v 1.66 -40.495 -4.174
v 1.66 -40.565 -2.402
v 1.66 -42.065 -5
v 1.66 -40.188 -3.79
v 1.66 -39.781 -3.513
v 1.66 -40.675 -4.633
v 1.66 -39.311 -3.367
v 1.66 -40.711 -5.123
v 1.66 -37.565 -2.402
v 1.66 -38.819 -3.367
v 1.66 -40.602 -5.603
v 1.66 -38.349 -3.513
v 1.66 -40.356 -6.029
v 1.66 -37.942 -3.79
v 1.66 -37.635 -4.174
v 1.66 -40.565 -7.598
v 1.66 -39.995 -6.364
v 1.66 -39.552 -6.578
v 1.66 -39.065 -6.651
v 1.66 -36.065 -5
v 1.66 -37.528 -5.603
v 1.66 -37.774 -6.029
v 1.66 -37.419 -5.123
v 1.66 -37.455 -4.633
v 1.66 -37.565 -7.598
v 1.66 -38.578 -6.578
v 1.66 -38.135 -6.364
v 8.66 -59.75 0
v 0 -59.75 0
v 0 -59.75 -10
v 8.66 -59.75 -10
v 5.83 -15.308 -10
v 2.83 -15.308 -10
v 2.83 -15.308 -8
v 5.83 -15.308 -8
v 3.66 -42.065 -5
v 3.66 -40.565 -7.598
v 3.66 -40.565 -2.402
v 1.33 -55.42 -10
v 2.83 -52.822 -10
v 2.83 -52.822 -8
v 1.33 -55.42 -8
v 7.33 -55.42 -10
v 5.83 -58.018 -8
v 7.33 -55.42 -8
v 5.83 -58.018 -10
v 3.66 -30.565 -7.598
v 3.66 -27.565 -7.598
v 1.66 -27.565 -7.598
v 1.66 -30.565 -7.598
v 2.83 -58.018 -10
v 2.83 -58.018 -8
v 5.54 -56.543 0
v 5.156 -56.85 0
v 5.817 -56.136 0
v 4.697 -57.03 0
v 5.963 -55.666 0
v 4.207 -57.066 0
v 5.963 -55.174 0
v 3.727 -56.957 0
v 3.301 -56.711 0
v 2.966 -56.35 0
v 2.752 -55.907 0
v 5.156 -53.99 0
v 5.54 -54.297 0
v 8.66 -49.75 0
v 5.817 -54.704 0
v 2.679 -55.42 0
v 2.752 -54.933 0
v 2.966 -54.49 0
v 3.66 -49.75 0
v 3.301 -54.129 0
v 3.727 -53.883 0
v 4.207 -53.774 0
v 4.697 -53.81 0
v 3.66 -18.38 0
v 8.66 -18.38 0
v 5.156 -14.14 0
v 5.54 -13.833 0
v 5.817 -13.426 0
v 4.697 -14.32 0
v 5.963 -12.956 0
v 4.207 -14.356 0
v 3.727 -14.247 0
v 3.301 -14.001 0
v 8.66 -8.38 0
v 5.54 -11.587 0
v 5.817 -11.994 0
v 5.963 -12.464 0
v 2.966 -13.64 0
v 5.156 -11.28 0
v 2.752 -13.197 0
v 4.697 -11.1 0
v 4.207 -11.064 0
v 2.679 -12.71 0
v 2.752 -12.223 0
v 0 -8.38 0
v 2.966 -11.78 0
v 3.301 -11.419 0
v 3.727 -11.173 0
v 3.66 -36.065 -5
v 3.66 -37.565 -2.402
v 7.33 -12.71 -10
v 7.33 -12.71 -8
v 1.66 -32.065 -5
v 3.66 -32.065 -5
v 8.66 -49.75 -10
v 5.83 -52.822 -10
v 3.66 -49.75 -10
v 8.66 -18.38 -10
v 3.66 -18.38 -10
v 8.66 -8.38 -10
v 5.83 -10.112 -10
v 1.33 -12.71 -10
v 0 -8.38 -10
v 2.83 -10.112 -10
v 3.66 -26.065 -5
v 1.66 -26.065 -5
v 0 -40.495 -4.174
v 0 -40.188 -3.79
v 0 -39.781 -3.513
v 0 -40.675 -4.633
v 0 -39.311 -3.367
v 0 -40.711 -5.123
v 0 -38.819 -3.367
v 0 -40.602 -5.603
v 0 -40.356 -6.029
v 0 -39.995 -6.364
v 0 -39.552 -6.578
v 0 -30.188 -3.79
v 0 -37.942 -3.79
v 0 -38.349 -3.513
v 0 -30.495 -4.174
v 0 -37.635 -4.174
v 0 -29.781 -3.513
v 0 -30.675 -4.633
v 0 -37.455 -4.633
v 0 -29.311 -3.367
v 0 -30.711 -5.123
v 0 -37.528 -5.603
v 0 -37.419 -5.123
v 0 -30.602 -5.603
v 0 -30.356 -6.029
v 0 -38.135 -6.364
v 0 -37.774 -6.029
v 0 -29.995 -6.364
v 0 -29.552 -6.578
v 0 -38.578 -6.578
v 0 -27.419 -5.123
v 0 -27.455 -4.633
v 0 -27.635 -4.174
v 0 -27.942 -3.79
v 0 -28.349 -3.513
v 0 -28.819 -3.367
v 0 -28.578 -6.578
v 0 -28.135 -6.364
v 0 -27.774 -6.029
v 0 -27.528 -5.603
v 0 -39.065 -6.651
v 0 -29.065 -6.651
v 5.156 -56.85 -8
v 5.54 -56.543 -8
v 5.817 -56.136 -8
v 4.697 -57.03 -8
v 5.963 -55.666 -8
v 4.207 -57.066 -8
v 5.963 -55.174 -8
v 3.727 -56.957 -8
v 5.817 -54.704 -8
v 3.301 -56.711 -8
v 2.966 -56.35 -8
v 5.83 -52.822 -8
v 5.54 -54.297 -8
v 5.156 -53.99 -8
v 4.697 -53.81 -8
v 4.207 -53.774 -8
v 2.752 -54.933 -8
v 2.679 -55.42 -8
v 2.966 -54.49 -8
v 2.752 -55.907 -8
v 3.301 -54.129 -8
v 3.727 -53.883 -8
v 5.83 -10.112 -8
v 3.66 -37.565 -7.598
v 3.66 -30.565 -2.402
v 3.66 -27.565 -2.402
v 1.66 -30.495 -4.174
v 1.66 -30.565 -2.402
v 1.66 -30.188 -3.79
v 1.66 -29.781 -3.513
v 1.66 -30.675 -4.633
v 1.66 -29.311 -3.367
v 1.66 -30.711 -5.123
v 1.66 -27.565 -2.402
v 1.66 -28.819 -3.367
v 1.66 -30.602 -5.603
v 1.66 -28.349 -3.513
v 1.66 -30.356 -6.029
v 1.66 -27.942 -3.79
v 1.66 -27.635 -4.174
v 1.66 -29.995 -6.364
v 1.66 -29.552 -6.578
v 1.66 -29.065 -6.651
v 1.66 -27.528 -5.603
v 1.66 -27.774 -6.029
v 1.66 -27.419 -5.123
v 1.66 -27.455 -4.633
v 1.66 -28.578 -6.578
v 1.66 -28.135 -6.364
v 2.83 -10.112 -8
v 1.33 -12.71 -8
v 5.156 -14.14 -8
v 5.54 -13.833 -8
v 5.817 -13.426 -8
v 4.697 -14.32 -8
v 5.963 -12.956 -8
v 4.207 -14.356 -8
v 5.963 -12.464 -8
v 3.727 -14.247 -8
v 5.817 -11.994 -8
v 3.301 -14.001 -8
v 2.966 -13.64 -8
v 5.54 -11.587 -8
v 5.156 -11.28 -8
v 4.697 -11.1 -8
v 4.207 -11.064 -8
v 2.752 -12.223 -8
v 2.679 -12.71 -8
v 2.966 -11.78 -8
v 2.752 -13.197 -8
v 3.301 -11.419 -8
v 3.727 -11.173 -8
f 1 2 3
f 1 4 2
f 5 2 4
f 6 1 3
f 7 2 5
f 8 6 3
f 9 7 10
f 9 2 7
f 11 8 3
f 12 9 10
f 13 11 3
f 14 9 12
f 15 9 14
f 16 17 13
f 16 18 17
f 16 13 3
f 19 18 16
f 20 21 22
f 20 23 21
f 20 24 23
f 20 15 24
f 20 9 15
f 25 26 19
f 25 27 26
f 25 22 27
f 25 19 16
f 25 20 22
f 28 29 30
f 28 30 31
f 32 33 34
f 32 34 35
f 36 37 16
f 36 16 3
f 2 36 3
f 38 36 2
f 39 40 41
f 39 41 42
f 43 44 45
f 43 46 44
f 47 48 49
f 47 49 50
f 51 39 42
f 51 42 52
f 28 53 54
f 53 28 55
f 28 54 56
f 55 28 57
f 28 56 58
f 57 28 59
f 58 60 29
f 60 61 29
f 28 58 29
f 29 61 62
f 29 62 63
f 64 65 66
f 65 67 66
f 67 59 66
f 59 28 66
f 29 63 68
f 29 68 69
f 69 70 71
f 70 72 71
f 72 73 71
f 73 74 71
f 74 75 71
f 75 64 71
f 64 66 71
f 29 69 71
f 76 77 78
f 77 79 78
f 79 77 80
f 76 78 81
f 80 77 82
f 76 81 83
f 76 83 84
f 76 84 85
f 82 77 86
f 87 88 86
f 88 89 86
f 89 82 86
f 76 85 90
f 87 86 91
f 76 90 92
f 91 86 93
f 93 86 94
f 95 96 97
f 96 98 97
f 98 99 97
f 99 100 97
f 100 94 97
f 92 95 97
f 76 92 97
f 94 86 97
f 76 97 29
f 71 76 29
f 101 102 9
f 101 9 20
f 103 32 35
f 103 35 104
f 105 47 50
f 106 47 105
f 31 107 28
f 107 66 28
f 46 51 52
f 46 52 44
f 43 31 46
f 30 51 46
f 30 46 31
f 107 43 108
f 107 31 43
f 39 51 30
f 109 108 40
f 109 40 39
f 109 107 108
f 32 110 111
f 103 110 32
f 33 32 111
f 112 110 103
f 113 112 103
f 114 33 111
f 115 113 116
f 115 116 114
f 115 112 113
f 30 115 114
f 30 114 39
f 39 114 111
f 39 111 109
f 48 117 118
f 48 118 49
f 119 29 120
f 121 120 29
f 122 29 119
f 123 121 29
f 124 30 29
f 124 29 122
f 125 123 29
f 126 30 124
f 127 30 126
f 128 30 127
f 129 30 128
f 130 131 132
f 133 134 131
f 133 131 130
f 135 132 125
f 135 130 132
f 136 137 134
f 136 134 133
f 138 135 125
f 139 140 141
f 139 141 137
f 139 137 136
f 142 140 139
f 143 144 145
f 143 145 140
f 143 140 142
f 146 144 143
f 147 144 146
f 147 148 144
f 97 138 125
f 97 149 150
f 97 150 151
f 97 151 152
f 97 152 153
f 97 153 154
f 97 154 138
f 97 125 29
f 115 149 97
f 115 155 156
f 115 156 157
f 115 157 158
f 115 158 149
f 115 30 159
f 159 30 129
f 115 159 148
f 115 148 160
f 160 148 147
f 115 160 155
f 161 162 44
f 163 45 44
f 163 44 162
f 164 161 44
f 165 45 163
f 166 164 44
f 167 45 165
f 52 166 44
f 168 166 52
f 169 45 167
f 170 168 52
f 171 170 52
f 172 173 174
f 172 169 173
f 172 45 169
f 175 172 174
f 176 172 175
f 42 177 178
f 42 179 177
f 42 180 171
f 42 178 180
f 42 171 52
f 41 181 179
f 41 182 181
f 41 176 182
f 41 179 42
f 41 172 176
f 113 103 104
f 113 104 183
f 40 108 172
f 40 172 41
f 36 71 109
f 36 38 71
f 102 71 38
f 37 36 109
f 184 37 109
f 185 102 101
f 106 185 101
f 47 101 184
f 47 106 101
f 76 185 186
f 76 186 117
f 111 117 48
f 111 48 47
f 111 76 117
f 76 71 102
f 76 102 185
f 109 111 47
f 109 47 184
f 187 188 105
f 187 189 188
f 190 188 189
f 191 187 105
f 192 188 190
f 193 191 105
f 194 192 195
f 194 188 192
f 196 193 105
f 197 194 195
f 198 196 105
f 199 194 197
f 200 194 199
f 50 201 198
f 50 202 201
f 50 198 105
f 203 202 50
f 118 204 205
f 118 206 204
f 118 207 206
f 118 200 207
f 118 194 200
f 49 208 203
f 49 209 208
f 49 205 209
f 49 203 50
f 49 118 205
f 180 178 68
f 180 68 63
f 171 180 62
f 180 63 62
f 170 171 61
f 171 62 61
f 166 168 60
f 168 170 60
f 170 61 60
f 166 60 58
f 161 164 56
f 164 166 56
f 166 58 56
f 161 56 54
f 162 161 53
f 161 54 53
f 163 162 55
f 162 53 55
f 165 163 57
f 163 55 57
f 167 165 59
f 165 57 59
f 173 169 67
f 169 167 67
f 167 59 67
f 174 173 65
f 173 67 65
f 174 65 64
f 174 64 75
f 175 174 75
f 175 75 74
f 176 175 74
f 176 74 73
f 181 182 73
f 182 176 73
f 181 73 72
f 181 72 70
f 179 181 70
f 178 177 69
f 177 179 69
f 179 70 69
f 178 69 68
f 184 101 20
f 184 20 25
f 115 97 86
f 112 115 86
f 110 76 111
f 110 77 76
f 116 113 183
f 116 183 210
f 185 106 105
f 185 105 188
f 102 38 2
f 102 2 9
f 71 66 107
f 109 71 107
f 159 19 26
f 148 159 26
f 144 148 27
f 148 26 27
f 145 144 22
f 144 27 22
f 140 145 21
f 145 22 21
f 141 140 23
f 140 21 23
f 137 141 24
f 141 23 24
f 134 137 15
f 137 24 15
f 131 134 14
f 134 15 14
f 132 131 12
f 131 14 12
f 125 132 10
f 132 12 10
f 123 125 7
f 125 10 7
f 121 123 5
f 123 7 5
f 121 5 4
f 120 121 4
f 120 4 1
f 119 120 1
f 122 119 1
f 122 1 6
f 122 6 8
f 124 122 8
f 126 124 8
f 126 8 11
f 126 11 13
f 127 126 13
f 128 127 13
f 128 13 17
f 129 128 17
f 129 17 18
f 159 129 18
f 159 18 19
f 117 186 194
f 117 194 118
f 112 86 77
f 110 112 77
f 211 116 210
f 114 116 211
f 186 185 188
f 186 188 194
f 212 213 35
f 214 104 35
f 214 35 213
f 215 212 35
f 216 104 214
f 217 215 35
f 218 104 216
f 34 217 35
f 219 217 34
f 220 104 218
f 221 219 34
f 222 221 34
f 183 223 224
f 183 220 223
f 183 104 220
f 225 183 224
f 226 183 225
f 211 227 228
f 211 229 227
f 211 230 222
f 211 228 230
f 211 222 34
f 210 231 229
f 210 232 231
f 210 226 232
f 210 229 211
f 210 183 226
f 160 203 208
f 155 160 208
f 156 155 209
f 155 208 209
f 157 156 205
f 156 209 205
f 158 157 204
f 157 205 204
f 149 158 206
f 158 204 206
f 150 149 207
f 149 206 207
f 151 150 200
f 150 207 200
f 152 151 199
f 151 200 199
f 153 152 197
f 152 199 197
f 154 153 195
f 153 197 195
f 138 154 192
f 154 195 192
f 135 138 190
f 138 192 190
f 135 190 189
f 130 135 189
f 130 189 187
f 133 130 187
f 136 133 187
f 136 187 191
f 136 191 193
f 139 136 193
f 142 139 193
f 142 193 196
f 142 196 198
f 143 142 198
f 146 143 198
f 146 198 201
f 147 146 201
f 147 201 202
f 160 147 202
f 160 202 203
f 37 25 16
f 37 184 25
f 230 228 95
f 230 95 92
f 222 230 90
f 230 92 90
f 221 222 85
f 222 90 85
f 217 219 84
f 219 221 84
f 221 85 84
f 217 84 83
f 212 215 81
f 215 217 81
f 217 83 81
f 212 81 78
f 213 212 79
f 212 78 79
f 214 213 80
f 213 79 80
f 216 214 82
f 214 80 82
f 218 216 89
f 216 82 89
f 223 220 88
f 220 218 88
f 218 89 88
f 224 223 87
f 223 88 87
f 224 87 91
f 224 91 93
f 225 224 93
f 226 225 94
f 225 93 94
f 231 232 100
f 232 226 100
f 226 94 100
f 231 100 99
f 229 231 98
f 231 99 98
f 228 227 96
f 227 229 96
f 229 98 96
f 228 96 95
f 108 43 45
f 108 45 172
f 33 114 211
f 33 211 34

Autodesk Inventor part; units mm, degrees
ref_plane "YZ Plane" through (0, 0, 0) normal (1, 0, 0) x (0, 1, 0)
ref_plane "XZ Plane" through (0, 0, 0) normal (0, 1, 0) x (-1, 0, 0)
ref_plane "XY Plane" through (0, 0, 0) normal (0, 0, 1) x (1, 0, 0)
sketch "Sketch1" plane through (0, 0, 0) normal (0, 0, 1) x (1, 0, 0)
  line L0 (0, 0) -> (41.5, 0)
  line L1 (41.5, 0) -> (41.5, -73)
  line L2 (41.5, -73) -> (0, -73)
  line L3 (0, -73) -> (0, 0)
  line L4 (0, -73) -> (3.11, -73)
  line L5 (0, -73) -> (3.11, -73) construction
  line L6 (3.11, -73) -> (3.11, -69.85)
  line L7 (3.11, -73) -> (6.26, -73) construction
  line L8 (3.11, -69.85) -> (14.54, -69.85)
  line L9 (14.54, -69.85) -> (19.65, -69.85)
  line L10 (19.65, -69.85) -> (31.08, -69.85)
  circle A0 centre (3.11, -69.85) radius 1.6
  circle A1 centre (14.54, -69.85) radius 1.6
  circle A2 centre (19.65, -69.85) radius 1.6
  circle A3 centre (31.08, -69.85) radius 1.6
  line L11 (3.11, -69.85) -> (3.11, -55.42)
  line L12 (3.11, -69.85) -> (17.54, -69.85) construction
  line L13 (0, -73) -> (4.33, -73)
  line L14 (0, -73) -> (4.33, -73) construction
  line L15 (4.33, -73) -> (4.33, -53.49)
  line L16 (3.11, -55.42) -> (6.6479, -55.42)
  circle A4 centre (4.33, -55.42) radius 1.651
  line L17 (4.33, -55.42) -> (4.33, -37.69)
  line L18 (4.33, -55.42) -> (22.06, -55.42) construction
  line L19 (4.33, -55.42) -> (29.68, -55.42)
  line L20 (4.33, -55.42) -> (29.68, -55.42) construction
  circle A5 centre (4.33, -37.69) radius 1.651
  circle A6 centre (29.68, -55.42) radius 1.651
  line L21 (4.33, -37.69) -> (39.0376, -37.69)
  line L22 (29.68, -55.42) -> (29.68, -25.3245)
  circle A7 centre (29.68, -37.69) radius 1.651
  line L23 (4.33, -37.69) -> (4.33, -30.44)
  line L24 (4.33, -37.69) -> (11.58, -37.69) construction
  line L25 (4.33, -30.44) -> (4.33, -12.71)
  line L26 (4.33, -30.44) -> (29.68, -30.44)
  line L27 (4.33, -30.44) -> (29.68, -30.44) construction
  line L28 (4.33, -12.71) -> (29.68, -12.71)
  circle A8 centre (29.48, -12.71) radius 1.651
  circle A9 centre (4.33, -12.71) radius 1.651
  circle A10 centre (4.33, -30.44) radius 1.651
  circle A11 centre (29.68, -30.44) radius 1.651
  dimension "d0" = 41.5
  dimension "d1" = 73
  dimension "d2" = 3.11
  dimension "d3" = 0
  dimension "d4" = 3.15
  dimension "d5" = 90
  dimension "d6" = 11.43
  dimension "d7" = 90
  dimension "d9" = 5.11
  dimension "d10" = 11.43
  dimension "d11" = 180
  dimension "d12" = 3.2
  dimension "d13" = 3.2
  dimension "d14" = 3.2
  dimension "d15" = 3.2
  dimension "d18" = 14.43
  dimension "d19" = 90
  dimension "d20" = 4.33
  dimension "d21" = 0
  dimension "d22" = 3.302
  dimension "d23" = 17.73
  dimension "d24" = 90
  dimension "d25" = 25.35
  dimension "d26" = 0
  dimension "d27" = 3.302
  dimension "d28" = 3.302
  dimension "d29" = 3.302
  dimension "d30" = 7.25
  dimension "d31" = 90
  dimension "d32" = 17.73
  dimension "d33" = 180
  dimension "d34" = 25.35
  dimension "d35" = 0
  dimension "d36" = 25.35
  dimension "d37" = 3.302
  dimension "d38" = 3.302
  dimension "d39" = 3.302
  dimension "d40" = 3.302
extrude "Extrusion2" add sketch "Sketch1" along normal blind 2 contours L0 L1 L2 L15 A0 A4 L16 L19 A6 L22 A7 A11 L26 A10 L23 A5 L17 L11 L6 L3 | L6 A0 L15 L2 | L11 A4 L15 A0 | L15 L17 A5 L21 A7 L22 A6 L19 L16 A4 | L23 A10 L26 A11 L22 A7 L21 A5
sketch "Sketch3" plane through (0, 0, 2) normal (0, 0, 1) x (1, 0, 0)
  circle A0 centre (4.33, -55.42) radius 1.651 projected
  circle A1 centre (4.33, -55.42) radius 3.5
  circle A2 centre (29.68, -55.42) radius 1.651 projected
  circle A3 centre (29.68, -55.42) radius 3.5
  circle A4 centre (4.33, -12.71) radius 1.651 projected
  circle A5 centre (4.33, -12.71) radius 3.5
  circle A6 centre (29.48, -12.71) radius 1.651 projected
  circle A7 centre (29.48, -12.71) radius 3.5
  point P0 (0, 0)
  dimension "d46" = 7
  dimension "d47" = 7
  dimension "d48" = 7
  dimension "d49" = 7
extrude "Extrusion4" add sketch "Sketch3" along normal blind 10
sketch "Sketch8" plane through (0, 0, 0) normal (0, 0, -1) x (-1, 0, 0)
  circle A0 centre (-4.33, -12.71) radius 1.651 projected
  circle A1 centre (-4.33, -12.71) radius 12.71
  line L0 (-41.5, 0) -> (0, 0) projected
  line L1 (8.38, -12.71) -> (8.38, -69.4926)
  circle A2 centre (-4.33, -55.42) radius 1.651 projected
  circle A3 centre (-4.33, -55.42) radius 12.71
  circle A4 centre (-4.33, -55.42) radius 4.33
  circle A5 centre (-4.33, -12.71) radius 4.33
  line L2 (0, -55.42) -> (0, -59.75)
  line L3 (0, -59.75) -> (-4.33, -59.75)
  line L4 (0, 0) -> (0, -73) projected
  line L5 (0, -12.71) -> (0, -8.38)
  line L6 (0, -8.38) -> (-4.33, -8.38)
  line L7 (0, -8.38) -> (-8.66, -8.38)
  line L8 (-8.66, -8.38) -> (-8.66, -59.75)
  line L9 (-8.66, -59.75) -> (0, -59.75)
  line L10 (0, -59.75) -> (0, -8.38)
  circle A6 centre (-4.33, -12.71) radius 1.651
  circle A7 centre (-4.33, -55.42) radius 1.651
extrude "Extrusion5" add sketch "Sketch8" along normal blind 10 contours L4 A3 L8 A1 | A1 L8 A5 L4 | L4 A5 L6 | A5 | L4 A4 L8 A3 | A5 L8 L7 | L2 L3 A4 | A4 | A4 L9 L8
sketch "Sketch9" plane through (8.66, -59.75, 0) normal (1, 0, 0) x (0, 0, -1)
  line L0 (10, 0) -> (10, 51.37) projected
  line L1 (10, 25.685) -> (0, 25.685)
  line L2 (0, 25.685) -> (0, 35.685)
  line L3 (0, 35.685) -> (10, 35.685)
  line L4 (10, 35.685) -> (10, 25.685)
  line L5 (10, 25.685) -> (0, 25.685)
  line L6 (0, 25.685) -> (0, 15.685)
  line L7 (0, 15.685) -> (10, 15.685)
  line L8 (10, 15.685) -> (10, 25.685)
  line L9 (10, 25.685) -> (0, 35.685)
  line L10 (10, 25.685) -> (0, 15.685)
  line L11 (0, 51.37) -> (10, 51.37) projected
  line L12 (10, 51.37) -> (0, 51.37)
  line L13 (0, 51.37) -> (0, 41.37)
  line L14 (0, 41.37) -> (10, 41.37)
  line L15 (10, 41.37) -> (10, 51.37)
  line L16 (10, 0) -> (0, 0)
  line L17 (0, 0) -> (0, 10)
  line L18 (0, 10) -> (10, 10)
  line L19 (10, 10) -> (10, 0)
  line L20 (10, 41.37) -> (0, 41.37)
  line L21 (0, 41.37) -> (0, 10)
  line L22 (0, 10) -> (10, 10)
  line L23 (10, 10) -> (10, 41.37)
  point P0 (0, 59.75)
  dimension "d55" = 10
  dimension "d56" = 10
  dimension "d57" = 10
  dimension "d58" = 10
  dimension "d59" = 10
  dimension "d60" = 10
  dimension "d61" = 10
  dimension "d62" = 10
extrude "Extrusion6" cut sketch "Sketch9" against normal blind 5 contours L18 L21 L7 L0 | L7 L10 L0 | L9 L3 L0 | L10 L6 L1 | L1 L2 L9 | L3 L21 L14 L0
sketch "Sketch11" plane through (3.66, -59.75, 0) normal (1, 0, 0) x (0, 0, -1)
  line L0 (10, 51.37) -> (10, 41.37) projected
  line L1 (10, 41.37) -> (0, 41.37)
  line L2 (0, 41.37) -> (0, 31.37)
  line L3 (0, 31.37) -> (10, 31.37)
  line L4 (10, 31.37) -> (10, 41.37)
  line L5 (10, 41.37) -> (10, 10) projected
  line L6 (10, 25.685) -> (0, 25.685)
  line L7 (0, 25.685) -> (0, 35.685)
  line L8 (0, 35.685) -> (10, 35.685)
  line L9 (10, 35.685) -> (10, 25.685)
  line L10 (10, 25.685) -> (0, 25.685)
  line L11 (0, 25.685) -> (0, 35.685)
  line L12 (0, 35.685) -> (10, 35.685)
  line L13 (10, 35.685) -> (10, 25.685)
  line L14 (10, 25.685) -> (0, 25.685)
  line L15 (0, 25.685) -> (0, 15.685)
  line L16 (0, 15.685) -> (10, 15.685)
  line L17 (10, 15.685) -> (10, 25.685)
  line L18 (10, 25.685) -> (0, 35.685)
  line L19 (10, 25.685) -> (0, 15.685)
  circle A0 centre (5, 30.685) radius 1.651
  circle A1 centre (5, 20.685) radius 1.651
  point P0 (0, 59.75)
  dimension "d65" = 10
  dimension "d66" = 10
  dimension "d67" = 10
  dimension "d68" = 10
  dimension "d69" = 10
  dimension "d70" = 10
  dimension "d71" = 10
  dimension "d72" = 10
  dimension "d73" = 3.302
  dimension "d74" = 3.302
extrude "Extrusion7" cut sketch "Sketch11" against normal blind 5 contours A0 L3 L18 | L18 L3 A0 | A0 L18 L3 | L3 L18 A0 | A1 L19 | L19 A1
sketch "Sketch12" plane through (0, 0, 0) normal (0, 0, -1) x (-1, 0, 0)
  line L0 (-41.5, -73) -> (-41.5, 0) projected
  line L1 (-41.5, -73) -> (0, -73)
  line L2 (0, -73) -> (0, 0)
  line L3 (0, 0) -> (-41.5, 0)
  line L4 (-41.5, 0) -> (-41.5, -73)
extrude "Extrusion8" cut sketch "Sketch12" against normal blind 30
sketch "Sketch14" plane through (3.66, -59.75, 0) normal (1, 0, 0) x (0, 0, -1)
  point P0 (0, 59.75)
sketch "Sketch15" plane through (0, 0, -10) normal (0, 0, -1) x (-1, 0, 0)
  circle A0 centre (-4.33, -55.42) radius 1.651 projected
  circle A1 centre (-4.33, -55.42) radius 1.651
  circle A2 centre (-4.33, -12.71) radius 1.651 projected
  circle A3 centre (-4.33, -12.71) radius 1.651
  circle A4 centre (-4.33, -12.71) radius 3
  circle A5 centre (-4.33, -55.42) radius 3
  line L0 (-7.33, -55.42) -> (-5.83, -52.8219)
  line L1 (-5.83, -52.8219) -> (-2.83, -52.8219)
  line L2 (-2.83, -52.8219) -> (-1.33, -55.42)
  line L3 (-1.33, -55.42) -> (-2.83, -58.0181)
  line L4 (-2.83, -58.0181) -> (-5.83, -58.0181)
  line L5 (-5.83, -58.0181) -> (-7.33, -55.42)
  line L6 (-7.33, -12.71) -> (-5.83, -10.1119)
  line L7 (-5.83, -10.1119) -> (-2.83, -10.1119)
  line L8 (-2.83, -10.1119) -> (-1.33, -12.71)
  line L9 (-1.33, -12.71) -> (-2.83, -15.3081)
  line L10 (-2.83, -15.3081) -> (-5.83, -15.3081)
  line L11 (-5.83, -15.3081) -> (-7.33, -12.71)
  point P0 (0, 0)
  dimension "d79" = 6
  dimension "d80" = 6
extrude "Extrusion9" cut sketch "Sketch15" against normal blind 2 contours L9 L10 L11 L6 L7 L8 | L3 L4 L5 L0 L1 L2
sketch "Sketch16" plane through (3.66, -59.75, 0) normal (1, 0, 0) x (0, 0, -1)
  circle A0 centre (5, 20.685) radius 1.651 projected
  circle A1 centre (5, 20.685) radius 3
  circle A2 centre (5, 30.685) radius 1.651 projected
  circle A3 centre (5, 30.685) radius 3
  line L0 (5, 17.685) -> (2.4019, 19.185)
  line L1 (2.4019, 19.185) -> (2.4019, 22.185)
  line L2 (2.4019, 22.185) -> (5, 23.685)
  line L3 (5, 23.685) -> (7.5981, 22.185)
  line L4 (7.5981, 22.185) -> (7.5981, 19.185)
  line L5 (7.5981, 19.185) -> (5, 17.685)
  line L6 (5, 27.685) -> (2.4019, 29.185)
  line L7 (2.4019, 29.185) -> (2.4019, 32.185)
  line L8 (2.4019, 32.185) -> (5, 33.685)
  line L9 (5, 33.685) -> (7.5981, 32.185)
  line L10 (7.5981, 32.185) -> (7.5981, 29.185)
  line L11 (7.5981, 29.185) -> (5, 27.685)
  point P0 (0, 59.75)
  dimension "d83" = 6
  dimension "d84" = 6
extrude "Extrusion10" cut sketch "Sketch16" against normal blind 2 contours L4 L5 L0 L1 L2 L3 | L10 L11 L6 L7 L8 L9
properties part number "mountBrace"
